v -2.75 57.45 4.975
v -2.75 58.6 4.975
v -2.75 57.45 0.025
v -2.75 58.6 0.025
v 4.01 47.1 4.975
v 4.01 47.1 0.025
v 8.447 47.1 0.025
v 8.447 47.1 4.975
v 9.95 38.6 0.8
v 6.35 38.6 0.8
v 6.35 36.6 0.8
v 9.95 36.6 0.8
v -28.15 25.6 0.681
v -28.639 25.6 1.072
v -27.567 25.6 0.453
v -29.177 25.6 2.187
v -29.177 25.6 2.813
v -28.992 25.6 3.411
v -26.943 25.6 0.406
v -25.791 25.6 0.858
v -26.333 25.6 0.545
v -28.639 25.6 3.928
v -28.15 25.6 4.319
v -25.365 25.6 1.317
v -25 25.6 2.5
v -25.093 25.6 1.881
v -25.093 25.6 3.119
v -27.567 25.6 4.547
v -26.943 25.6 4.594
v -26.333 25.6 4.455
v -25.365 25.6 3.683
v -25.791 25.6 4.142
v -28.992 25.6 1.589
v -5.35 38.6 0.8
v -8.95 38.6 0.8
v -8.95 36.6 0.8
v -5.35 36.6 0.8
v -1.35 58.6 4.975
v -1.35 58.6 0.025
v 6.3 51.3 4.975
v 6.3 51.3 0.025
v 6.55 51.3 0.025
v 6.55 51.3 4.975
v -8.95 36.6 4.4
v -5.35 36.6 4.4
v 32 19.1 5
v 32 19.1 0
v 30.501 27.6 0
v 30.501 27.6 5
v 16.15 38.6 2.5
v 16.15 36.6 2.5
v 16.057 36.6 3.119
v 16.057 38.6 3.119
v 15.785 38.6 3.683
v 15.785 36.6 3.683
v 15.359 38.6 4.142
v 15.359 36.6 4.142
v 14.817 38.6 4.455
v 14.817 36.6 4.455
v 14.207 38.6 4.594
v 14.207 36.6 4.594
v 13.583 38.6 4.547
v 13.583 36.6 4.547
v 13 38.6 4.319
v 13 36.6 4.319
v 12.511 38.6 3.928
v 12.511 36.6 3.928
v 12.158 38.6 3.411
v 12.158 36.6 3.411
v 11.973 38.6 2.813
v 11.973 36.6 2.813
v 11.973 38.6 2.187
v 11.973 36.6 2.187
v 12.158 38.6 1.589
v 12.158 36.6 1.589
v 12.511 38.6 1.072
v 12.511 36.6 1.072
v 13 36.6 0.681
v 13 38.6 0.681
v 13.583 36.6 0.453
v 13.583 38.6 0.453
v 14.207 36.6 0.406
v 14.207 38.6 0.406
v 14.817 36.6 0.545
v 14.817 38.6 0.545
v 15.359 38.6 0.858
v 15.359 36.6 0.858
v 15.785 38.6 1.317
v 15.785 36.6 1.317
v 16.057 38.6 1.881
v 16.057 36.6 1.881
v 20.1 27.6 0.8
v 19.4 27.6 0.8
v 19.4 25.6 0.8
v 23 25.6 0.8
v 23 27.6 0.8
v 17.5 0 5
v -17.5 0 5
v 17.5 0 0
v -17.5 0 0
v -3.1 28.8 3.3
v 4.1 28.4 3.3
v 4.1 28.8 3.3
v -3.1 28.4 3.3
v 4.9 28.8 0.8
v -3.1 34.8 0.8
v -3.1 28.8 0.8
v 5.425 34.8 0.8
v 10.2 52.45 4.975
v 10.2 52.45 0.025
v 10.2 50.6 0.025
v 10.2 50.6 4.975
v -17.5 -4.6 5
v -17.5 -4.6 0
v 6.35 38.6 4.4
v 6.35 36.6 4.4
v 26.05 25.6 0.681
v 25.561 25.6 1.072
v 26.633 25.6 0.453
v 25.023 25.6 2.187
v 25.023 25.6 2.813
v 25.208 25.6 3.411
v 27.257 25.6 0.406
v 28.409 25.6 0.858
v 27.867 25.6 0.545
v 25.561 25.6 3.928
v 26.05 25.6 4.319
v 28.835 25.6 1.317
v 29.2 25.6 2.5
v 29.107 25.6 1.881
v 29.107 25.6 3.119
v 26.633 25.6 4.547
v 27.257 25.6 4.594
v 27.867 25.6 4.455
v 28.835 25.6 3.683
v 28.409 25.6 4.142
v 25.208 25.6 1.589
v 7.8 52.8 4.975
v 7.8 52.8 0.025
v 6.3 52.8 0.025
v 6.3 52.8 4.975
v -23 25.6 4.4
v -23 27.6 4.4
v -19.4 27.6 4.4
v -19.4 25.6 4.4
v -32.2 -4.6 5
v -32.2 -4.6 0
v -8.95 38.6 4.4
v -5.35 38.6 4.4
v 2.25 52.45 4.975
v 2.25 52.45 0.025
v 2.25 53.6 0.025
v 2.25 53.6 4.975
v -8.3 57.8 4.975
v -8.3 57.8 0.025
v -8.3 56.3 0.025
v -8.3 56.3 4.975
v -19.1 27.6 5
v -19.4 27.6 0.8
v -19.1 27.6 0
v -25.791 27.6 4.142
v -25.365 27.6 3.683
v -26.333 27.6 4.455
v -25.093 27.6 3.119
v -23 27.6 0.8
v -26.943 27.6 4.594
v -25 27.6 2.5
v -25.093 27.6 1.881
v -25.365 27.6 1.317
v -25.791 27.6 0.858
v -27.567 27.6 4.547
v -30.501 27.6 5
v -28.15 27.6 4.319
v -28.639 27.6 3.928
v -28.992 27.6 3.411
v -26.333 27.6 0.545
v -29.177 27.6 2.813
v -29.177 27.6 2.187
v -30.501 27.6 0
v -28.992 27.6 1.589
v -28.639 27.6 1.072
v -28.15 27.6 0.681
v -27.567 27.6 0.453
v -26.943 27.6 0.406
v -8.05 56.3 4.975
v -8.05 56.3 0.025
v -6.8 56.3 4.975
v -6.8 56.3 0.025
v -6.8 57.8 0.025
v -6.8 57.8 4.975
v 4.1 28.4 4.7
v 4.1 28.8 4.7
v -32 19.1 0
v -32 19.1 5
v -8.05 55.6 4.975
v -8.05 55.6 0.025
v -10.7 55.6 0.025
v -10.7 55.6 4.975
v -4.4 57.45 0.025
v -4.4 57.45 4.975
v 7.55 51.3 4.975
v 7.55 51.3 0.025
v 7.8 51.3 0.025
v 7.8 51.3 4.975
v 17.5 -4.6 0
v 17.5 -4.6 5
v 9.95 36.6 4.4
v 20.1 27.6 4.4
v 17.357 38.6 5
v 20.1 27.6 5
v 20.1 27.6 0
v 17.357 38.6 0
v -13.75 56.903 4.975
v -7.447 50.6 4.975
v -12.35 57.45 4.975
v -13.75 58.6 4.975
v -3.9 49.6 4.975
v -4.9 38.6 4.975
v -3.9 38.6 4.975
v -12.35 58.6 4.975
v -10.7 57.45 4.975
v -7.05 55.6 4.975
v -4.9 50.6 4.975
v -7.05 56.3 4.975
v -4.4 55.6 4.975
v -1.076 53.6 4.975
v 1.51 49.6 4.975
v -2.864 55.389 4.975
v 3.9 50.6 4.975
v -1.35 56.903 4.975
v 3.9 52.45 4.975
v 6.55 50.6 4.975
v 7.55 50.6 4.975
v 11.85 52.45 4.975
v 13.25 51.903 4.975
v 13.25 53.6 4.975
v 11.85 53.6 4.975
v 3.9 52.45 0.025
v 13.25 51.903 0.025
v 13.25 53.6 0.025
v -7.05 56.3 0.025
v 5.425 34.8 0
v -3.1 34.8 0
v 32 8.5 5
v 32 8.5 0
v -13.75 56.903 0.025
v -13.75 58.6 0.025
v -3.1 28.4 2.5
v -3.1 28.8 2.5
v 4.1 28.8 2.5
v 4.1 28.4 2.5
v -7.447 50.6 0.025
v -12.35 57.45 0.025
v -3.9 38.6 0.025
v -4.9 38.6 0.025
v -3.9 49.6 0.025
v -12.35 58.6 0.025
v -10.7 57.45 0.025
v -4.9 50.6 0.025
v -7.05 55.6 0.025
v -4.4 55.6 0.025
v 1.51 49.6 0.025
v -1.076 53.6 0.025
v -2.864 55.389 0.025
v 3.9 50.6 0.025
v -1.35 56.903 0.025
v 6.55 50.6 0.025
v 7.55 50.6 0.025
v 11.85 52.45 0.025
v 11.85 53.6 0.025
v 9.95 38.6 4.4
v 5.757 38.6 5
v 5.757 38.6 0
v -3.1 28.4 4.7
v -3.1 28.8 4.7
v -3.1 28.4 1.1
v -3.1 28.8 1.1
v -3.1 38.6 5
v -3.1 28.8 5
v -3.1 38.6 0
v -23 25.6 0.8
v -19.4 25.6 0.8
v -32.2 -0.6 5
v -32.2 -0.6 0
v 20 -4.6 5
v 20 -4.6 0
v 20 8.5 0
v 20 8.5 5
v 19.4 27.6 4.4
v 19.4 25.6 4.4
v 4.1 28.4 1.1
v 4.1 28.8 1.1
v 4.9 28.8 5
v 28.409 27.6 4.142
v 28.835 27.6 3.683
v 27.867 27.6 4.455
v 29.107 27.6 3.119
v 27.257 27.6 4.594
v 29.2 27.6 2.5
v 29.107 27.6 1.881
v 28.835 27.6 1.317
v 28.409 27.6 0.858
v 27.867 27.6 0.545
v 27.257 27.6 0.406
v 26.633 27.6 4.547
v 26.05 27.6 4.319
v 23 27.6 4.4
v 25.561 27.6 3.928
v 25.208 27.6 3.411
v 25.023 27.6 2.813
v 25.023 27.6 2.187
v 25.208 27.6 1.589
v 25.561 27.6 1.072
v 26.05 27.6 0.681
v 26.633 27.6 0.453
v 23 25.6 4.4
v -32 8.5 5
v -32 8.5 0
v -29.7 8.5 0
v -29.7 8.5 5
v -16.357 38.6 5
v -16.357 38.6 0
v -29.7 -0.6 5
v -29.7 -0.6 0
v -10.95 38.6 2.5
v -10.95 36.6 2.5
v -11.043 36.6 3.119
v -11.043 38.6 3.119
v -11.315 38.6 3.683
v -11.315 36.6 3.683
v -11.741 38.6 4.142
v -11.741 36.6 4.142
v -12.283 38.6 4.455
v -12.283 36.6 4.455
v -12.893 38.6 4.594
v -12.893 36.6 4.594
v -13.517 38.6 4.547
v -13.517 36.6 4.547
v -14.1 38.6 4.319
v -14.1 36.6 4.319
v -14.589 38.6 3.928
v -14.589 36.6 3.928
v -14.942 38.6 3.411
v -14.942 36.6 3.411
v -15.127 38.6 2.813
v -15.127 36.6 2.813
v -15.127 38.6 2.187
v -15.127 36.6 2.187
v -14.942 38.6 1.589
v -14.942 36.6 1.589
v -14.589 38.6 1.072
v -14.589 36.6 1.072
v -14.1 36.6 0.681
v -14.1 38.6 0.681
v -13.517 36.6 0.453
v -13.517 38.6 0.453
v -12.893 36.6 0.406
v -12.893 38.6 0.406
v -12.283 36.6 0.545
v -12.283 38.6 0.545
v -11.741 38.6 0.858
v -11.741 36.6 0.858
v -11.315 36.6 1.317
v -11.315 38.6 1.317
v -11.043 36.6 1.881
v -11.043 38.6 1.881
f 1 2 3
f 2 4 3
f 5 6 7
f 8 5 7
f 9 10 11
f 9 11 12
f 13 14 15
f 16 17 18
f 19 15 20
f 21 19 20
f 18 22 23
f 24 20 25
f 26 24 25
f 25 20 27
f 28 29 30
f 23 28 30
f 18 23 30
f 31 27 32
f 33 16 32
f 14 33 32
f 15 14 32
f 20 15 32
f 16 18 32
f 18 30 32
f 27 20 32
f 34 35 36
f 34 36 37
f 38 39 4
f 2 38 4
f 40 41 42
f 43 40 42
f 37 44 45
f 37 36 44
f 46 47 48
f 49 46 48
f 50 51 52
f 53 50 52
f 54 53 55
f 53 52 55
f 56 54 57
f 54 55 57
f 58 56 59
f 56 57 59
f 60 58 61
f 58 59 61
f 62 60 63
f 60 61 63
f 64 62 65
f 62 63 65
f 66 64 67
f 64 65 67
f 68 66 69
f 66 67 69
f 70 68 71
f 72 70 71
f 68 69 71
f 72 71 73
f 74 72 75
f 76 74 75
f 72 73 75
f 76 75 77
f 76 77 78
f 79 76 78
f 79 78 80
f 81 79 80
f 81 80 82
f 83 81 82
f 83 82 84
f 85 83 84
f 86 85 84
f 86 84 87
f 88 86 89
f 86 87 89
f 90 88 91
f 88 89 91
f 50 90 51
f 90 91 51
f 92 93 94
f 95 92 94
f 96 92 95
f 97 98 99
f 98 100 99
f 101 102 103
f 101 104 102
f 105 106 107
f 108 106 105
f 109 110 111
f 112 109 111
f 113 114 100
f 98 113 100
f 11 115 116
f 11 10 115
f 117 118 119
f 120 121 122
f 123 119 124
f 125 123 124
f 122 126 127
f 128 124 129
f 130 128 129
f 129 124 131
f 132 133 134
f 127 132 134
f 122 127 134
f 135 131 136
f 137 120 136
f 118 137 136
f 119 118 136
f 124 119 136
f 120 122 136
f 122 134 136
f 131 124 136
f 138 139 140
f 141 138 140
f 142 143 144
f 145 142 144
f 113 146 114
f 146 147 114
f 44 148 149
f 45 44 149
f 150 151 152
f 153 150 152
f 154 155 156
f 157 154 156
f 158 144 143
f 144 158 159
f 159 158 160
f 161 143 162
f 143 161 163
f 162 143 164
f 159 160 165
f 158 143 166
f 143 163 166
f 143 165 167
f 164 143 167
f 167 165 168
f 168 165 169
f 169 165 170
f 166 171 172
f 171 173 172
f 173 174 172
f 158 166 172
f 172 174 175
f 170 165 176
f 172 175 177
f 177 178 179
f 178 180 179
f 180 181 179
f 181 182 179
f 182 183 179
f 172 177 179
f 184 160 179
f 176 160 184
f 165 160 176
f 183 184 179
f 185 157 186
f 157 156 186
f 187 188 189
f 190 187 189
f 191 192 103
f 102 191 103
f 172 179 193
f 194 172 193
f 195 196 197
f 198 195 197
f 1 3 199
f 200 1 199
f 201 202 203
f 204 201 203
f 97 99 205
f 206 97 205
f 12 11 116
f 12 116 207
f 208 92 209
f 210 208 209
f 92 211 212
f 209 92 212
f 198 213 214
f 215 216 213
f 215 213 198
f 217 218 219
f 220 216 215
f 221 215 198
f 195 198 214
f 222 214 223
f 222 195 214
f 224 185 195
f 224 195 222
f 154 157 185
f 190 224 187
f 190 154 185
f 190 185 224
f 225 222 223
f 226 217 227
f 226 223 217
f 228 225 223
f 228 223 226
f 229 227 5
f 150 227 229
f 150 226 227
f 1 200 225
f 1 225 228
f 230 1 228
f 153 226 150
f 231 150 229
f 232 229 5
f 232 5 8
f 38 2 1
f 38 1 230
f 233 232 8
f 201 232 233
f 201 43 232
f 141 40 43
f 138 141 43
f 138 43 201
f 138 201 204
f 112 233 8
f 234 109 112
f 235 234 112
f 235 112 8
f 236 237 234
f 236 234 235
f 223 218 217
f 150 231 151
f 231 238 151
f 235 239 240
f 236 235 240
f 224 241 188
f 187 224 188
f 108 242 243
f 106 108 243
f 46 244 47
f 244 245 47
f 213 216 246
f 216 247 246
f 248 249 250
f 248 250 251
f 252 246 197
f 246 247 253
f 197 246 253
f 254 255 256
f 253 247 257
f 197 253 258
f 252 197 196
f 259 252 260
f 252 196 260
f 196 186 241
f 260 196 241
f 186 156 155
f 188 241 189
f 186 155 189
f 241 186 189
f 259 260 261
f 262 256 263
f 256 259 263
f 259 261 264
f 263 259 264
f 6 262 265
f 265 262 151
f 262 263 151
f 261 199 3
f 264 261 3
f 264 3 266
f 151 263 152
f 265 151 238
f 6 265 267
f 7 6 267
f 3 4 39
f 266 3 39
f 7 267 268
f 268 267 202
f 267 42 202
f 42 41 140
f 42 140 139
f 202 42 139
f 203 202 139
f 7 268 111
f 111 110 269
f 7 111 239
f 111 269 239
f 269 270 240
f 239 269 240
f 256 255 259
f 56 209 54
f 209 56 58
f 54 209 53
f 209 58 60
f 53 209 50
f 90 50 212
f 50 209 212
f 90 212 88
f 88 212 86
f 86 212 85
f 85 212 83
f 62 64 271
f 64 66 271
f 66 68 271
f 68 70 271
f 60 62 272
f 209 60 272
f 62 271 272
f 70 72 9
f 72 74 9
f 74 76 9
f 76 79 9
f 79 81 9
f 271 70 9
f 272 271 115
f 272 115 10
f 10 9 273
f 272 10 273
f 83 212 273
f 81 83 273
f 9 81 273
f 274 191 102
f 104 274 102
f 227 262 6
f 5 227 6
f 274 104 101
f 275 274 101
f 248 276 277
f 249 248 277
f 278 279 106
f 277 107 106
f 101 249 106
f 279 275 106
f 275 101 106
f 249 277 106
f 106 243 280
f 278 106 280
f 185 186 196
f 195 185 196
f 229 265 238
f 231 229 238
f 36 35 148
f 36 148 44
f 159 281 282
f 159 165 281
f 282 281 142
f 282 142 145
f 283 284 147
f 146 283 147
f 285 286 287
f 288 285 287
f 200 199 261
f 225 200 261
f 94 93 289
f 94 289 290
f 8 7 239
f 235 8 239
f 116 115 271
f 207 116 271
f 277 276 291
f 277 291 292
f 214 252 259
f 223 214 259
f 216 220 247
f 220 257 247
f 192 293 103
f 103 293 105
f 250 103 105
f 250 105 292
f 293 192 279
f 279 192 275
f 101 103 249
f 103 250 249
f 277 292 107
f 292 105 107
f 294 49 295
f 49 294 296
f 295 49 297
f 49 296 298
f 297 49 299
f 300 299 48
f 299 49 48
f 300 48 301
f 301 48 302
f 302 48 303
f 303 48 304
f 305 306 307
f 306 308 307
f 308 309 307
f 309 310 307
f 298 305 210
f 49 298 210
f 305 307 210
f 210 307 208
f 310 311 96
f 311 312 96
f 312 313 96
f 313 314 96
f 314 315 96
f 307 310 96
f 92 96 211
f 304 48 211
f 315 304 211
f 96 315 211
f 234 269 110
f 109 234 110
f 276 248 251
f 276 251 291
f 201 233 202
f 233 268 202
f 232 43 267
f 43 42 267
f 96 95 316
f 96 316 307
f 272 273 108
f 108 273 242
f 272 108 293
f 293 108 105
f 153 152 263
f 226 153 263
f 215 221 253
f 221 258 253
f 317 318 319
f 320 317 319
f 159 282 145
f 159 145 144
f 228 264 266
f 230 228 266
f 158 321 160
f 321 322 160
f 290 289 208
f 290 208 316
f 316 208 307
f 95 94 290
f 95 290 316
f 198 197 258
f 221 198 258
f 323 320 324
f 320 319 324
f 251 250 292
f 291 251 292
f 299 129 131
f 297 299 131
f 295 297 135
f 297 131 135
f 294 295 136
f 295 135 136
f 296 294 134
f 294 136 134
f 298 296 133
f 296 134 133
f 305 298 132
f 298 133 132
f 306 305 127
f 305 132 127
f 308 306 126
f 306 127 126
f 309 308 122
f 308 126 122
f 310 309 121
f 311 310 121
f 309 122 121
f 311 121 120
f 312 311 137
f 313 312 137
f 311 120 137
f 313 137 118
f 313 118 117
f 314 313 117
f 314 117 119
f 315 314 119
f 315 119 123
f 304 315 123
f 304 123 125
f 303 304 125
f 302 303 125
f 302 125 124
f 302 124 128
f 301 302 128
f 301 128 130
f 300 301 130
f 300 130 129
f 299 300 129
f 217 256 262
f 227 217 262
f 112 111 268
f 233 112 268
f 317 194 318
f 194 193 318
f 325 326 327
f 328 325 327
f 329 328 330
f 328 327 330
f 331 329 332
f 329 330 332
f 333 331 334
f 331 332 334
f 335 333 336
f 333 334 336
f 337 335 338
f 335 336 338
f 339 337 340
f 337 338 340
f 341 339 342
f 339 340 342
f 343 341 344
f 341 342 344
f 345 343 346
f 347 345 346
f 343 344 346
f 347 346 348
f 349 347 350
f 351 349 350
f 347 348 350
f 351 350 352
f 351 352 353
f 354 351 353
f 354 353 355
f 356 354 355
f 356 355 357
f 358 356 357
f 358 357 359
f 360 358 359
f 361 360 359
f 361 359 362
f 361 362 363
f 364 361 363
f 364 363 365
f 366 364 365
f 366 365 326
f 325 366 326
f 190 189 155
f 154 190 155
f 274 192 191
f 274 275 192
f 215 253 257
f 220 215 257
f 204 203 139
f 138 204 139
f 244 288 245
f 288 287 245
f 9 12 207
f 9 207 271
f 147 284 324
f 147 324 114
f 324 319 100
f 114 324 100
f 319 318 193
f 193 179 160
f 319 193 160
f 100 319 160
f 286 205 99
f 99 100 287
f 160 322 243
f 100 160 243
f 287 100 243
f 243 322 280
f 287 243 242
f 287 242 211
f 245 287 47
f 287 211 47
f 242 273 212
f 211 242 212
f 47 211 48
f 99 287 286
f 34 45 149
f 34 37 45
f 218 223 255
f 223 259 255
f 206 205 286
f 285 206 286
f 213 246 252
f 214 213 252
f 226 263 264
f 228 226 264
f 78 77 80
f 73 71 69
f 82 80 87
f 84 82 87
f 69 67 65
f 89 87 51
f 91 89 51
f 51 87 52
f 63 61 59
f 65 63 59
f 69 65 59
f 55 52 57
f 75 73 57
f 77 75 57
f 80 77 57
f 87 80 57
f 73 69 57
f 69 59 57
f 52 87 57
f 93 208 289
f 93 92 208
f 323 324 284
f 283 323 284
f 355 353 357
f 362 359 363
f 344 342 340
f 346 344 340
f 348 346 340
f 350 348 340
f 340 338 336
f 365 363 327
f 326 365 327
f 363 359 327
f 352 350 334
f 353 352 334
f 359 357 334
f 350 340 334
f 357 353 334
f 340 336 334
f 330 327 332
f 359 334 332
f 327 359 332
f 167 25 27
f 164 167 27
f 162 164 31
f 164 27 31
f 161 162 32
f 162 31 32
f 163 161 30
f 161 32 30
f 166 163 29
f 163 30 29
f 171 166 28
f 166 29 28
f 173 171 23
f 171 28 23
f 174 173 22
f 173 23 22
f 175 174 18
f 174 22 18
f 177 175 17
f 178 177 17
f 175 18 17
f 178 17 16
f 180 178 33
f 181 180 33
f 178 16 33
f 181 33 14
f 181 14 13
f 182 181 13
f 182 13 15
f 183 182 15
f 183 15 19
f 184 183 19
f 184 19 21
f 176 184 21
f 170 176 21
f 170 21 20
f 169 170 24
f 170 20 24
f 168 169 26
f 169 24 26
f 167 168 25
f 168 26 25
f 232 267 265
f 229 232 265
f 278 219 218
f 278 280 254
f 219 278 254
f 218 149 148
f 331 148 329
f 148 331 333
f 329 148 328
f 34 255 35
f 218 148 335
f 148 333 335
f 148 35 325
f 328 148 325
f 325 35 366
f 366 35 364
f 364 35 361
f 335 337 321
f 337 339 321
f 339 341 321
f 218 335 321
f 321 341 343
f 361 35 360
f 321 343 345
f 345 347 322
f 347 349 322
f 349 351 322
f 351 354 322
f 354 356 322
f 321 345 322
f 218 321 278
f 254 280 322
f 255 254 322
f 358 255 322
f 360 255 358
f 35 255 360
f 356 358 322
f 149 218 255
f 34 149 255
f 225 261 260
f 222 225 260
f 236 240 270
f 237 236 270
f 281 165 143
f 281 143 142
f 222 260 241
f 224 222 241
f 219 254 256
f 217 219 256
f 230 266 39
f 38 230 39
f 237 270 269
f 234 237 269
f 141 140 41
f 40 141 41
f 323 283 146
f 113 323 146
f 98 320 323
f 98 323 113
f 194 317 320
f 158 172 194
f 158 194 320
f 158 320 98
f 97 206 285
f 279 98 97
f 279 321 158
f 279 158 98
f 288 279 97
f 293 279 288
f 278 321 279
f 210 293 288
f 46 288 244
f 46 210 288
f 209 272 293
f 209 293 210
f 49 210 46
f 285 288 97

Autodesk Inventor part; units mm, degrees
sketch "Sketch_1" plane through (0, 0, 0) normal (0, 0, 1) x (1, 0, 0)
  line L0 (-32.2, -0.6) -> (-32.2, -4.6)
  line L1 (-32.2, -4.6) -> (-17.5, -4.6)
  line L2 (-17.5, -4.6) -> (-17.5, 0)
  line L3 (-17.5, 0) -> (17.5, 0)
  line L4 (17.5, 0) -> (17.5, -4.6)
  line L5 (17.5, -4.6) -> (20, -4.6)
  line L6 (20, -4.6) -> (20, 8.5)
  line L7 (20, 8.5) -> (32, 8.5)
  line L8 (32, 8.5) -> (32, 19.1)
  line L9 (32, 19.1) -> (30.5012, 27.6)
  line L10 (30.5012, 27.6) -> (-30.5012, 27.6)
  line L11 (-30.5012, 27.6) -> (-32, 19.1)
  line L12 (-32, 19.1) -> (-32, 8.5)
  line L13 (-32, 8.5) -> (-29.7, 8.5)
  line L14 (-29.7, 8.5) -> (-29.7, -0.6)
  line L15 (-29.7, -0.6) -> (-32.2, -0.6)
extrude "Extrusion1" add sketch "Sketch_1" along normal blind 5
sketch "Sketch_2" plane through (0, 0, 0) normal (0, 0, 1) x (1, 0, 0)
  line L0 (-19.1, 27.6) -> (-18.2, 27.6)
  line L1 (-18.2, 27.6) -> (-18.2, 15.1)
  line L2 (-18.2, 15.1) -> (19.2, 15.1)
  line L3 (19.2, 15.1) -> (19.2, 27.6)
  line L4 (19.2, 27.6) -> (20.1, 27.6)
  line L5 (20.1, 27.6) -> (17.3574, 38.6)
  line L6 (17.3574, 38.6) -> (5.7574, 38.6)
  line L7 (5.7574, 38.6) -> (4.9, 28.8)
  line L8 (4.9, 28.8) -> (-3.1, 28.8)
  line L9 (-3.1, 28.8) -> (-3.1, 38.6)
  line L10 (-3.1, 38.6) -> (-16.3574, 38.6)
  line L11 (-16.3574, 38.6) -> (-19.1, 27.6)
extrude "Extrusion2" add sketch "Sketch_2" along normal blind 5
sketch "Skizze_3" plane through (0, 0, 0) normal (0, 0, 1) x (1, 0, 0)
  line L0 (-3.1, 34.8) -> (-3.1, 28.8)
  line L1 (-3.1, 28.8) -> (5.9, 28.8)
  line L2 (5.9, 28.8) -> (5.9, 34.8)
  line L3 (5.9, 34.8) -> (-3.1, 34.8)
extrude "Extrusion3" add sketch "Skizze_3" along normal blind 0.8
sketch "Sketch_3" plane through (0.5, 0, 0) normal (1, 0, 0) x (0, 0, -1)
  line L0 (-4.7, 28.4) -> (-3.3, 28.4)
  line L1 (-3.3, 28.4) -> (-3.3, 28.8)
  line L2 (-3.3, 28.8) -> (-2.5, 28.8)
  line L3 (-2.5, 28.8) -> (-2.5, 28.4)
  line L4 (-2.5, 28.4) -> (-1.1, 28.4)
  line L5 (-1.1, 28.4) -> (-1.1, 29.8)
  line L6 (-1.1, 29.8) -> (-4.7, 29.8)
  line L7 (-4.7, 29.8) -> (-4.7, 28.4)
extrude "Extrusion4" cut sketch "Sketch_3" along normal mid plane 7.2
sketch "Sketch_4" plane through (0, 0, 2.5) normal (0, 0, 1) x (1, 0, 0)
  line L0 (27.1, 25.6) -> (27.1, 27.6)
  line L1 (27.1, 27.6) -> (29.2, 27.6)
  line L2 (29.2, 27.6) -> (29.2, 25.6)
  line L3 (29.2, 25.6) -> (27.1, 25.6)
  line L4 (27.1, 25.6) -> (27.1, 27.6)
revolve "Revolution1" cut sketch "Sketch_4" angle 360 about axis through (27.1, 25.6, 2.5) along (0, -1, 0)
sketch "Sketch_5" plane through (0, 0, 2.5) normal (0, 0, 1) x (1, 0, 0)
  line L0 (-27.1, 25.6) -> (-27.1, 27.6)
  line L1 (-27.1, 27.6) -> (-25, 27.6)
  line L2 (-25, 27.6) -> (-25, 25.6)
  line L3 (-25, 25.6) -> (-27.1, 25.6)
  line L4 (-27.1, 25.6) -> (-27.1, 27.6)
revolve "Revolution2" cut sketch "Sketch_5" angle 360 about axis through (-27.1, 25.6, 2.5) along (0, -1, 0)
sketch "Sketch_6" plane through (0, 0, 2.5) normal (0, 0, 1) x (1, 0, 0)
  line L0 (14.05, 36.6) -> (14.05, 38.6)
  line L1 (14.05, 38.6) -> (16.15, 38.6)
  line L2 (16.15, 38.6) -> (16.15, 36.6)
  line L3 (16.15, 36.6) -> (14.05, 36.6)
  line L4 (14.05, 36.6) -> (14.05, 38.6)
revolve "Revolution3" cut sketch "Sketch_6" angle 360 about axis through (14.05, 36.6, 2.5) along (0, -1, 0)
sketch "Sketch_7" plane through (0, 0, 2.5) normal (0, 0, 1) x (1, 0, 0)
  line L0 (-13.05, 36.6) -> (-13.05, 38.6)
  line L1 (-13.05, 38.6) -> (-10.95, 38.6)
  line L2 (-10.95, 38.6) -> (-10.95, 36.6)
  line L3 (-10.95, 36.6) -> (-13.05, 36.6)
  line L4 (-13.05, 36.6) -> (-13.05, 38.6)
revolve "Revolution4" cut sketch "Sketch_7" angle 360 about axis through (-13.05, 36.6, 2.5) along (0, -1, 0)
sketch "Skizze_15" plane through (0, 0, 2.5) normal (0, 0, 1) x (1, 0, 0)
  line L0 (-4.9, 36.6) -> (-3.9, 36.6)
  line L1 (-3.9, 36.6) -> (-3.9, 38.6)
  line L2 (-3.9, 38.6) -> (-4.9, 38.6)
  line L3 (-4.9, 38.6) -> (-4.9, 36.6)
extrude "Extrusion5" cut sketch "Skizze_15" along normal mid plane 4.1
sketch "Skizze_11" plane through (0, 0, 0.8) normal (0, 0, 1) x (1, 0, 0)
  line L0 (19.4, 25.6) -> (23, 25.6)
  line L1 (23, 25.6) -> (23, 27.6)
  line L2 (23, 27.6) -> (19.4, 27.6)
  line L3 (19.4, 27.6) -> (19.4, 25.6)
extrude "Extrusion6" cut sketch "Skizze_11" along normal blind 3.6
sketch "Skizze_12" plane through (0, 0, 0.8) normal (0, 0, 1) x (1, 0, 0)
  line L0 (-23, 25.6) -> (-19.4, 25.6)
  line L1 (-19.4, 25.6) -> (-19.4, 27.6)
  line L2 (-19.4, 27.6) -> (-23, 27.6)
  line L3 (-23, 27.6) -> (-23, 25.6)
extrude "Extrusion7" cut sketch "Skizze_12" along normal blind 3.6
sketch "Skizze_13" plane through (0, 0, 0.8) normal (0, 0, 1) x (1, 0, 0)
  line L0 (6.35, 36.6) -> (9.95, 36.6)
  line L1 (9.95, 36.6) -> (9.95, 38.6)
  line L2 (9.95, 38.6) -> (6.35, 38.6)
  line L3 (6.35, 38.6) -> (6.35, 36.6)
extrude "Extrusion8" cut sketch "Skizze_13" along normal blind 3.6
sketch "Skizze_14" plane through (0, 0, 0.8) normal (0, 0, 1) x (1, 0, 0)
  line L0 (-8.95, 36.6) -> (-5.35, 36.6)
  line L1 (-5.35, 36.6) -> (-5.35, 38.6)
  line L2 (-5.35, 38.6) -> (-8.95, 38.6)
  line L3 (-8.95, 38.6) -> (-8.95, 36.6)
extrude "Extrusion9" cut sketch "Skizze_14" along normal blind 3.6
sketch "Sketch_8" plane through (0, 0, 2.5) normal (0, 0, 1) x (1, 0, 0)
  line L0 (-13.75, 56.9029) -> (-7.4471, 50.6)
  line L1 (-7.4471, 50.6) -> (-4.9, 50.6)
  line L2 (-4.9, 50.6) -> (-4.9, 33.6)
  line L3 (-4.9, 33.6) -> (-3.9, 33.6)
  line L4 (-3.9, 33.6) -> (-3.9, 49.6)
  line L5 (-3.9, 49.6) -> (1.5103, 49.6)
  line L6 (1.5103, 49.6) -> (4.0103, 47.1)
  line L7 (4.0103, 47.1) -> (8.4471, 47.1)
  line L8 (8.4471, 47.1) -> (13.25, 51.9029)
  line L9 (13.25, 51.9029) -> (13.25, 53.6)
  line L10 (13.25, 53.6) -> (11.85, 53.6)
  line L11 (11.85, 53.6) -> (11.85, 52.45)
  line L12 (11.85, 52.45) -> (10.2, 52.45)
  line L13 (10.2, 52.45) -> (10.2, 50.6)
  line L14 (10.2, 50.6) -> (7.55, 50.6)
  line L15 (7.55, 50.6) -> (7.55, 51.3)
  line L16 (7.55, 51.3) -> (7.8, 51.3)
  line L17 (7.8, 51.3) -> (7.8, 52.8)
  line L18 (7.8, 52.8) -> (6.3, 52.8)
  line L19 (6.3, 52.8) -> (6.3, 51.3)
  line L20 (6.3, 51.3) -> (6.55, 51.3)
  line L21 (6.55, 51.3) -> (6.55, 50.6)
  line L22 (6.55, 50.6) -> (3.9, 50.6)
  line L23 (3.9, 50.6) -> (3.9, 52.45)
  line L24 (3.9, 52.45) -> (2.25, 52.45)
  line L25 (2.25, 52.45) -> (2.25, 53.6)
  line L26 (2.25, 53.6) -> (-1.0755, 53.6)
  line L27 (-1.0755, 53.6) -> (-2.8642, 55.3887)
  line L28 (-2.8642, 55.3887) -> (-1.35, 56.9029)
  line L29 (-1.35, 56.9029) -> (-1.35, 58.6)
  line L30 (-1.35, 58.6) -> (-2.75, 58.6)
  line L31 (-2.75, 58.6) -> (-2.75, 57.45)
  line L32 (-2.75, 57.45) -> (-4.4, 57.45)
  line L33 (-4.4, 57.45) -> (-4.4, 55.6)
  line L34 (-4.4, 55.6) -> (-7.05, 55.6)
  line L35 (-7.05, 55.6) -> (-7.05, 56.3)
  line L36 (-7.05, 56.3) -> (-6.8, 56.3)
  line L37 (-6.8, 56.3) -> (-6.8, 57.8)
  line L38 (-6.8, 57.8) -> (-8.3, 57.8)
  line L39 (-8.3, 57.8) -> (-8.3, 56.3)
  line L40 (-8.3, 56.3) -> (-8.05, 56.3)
  line L41 (-8.05, 56.3) -> (-8.05, 55.6)
  line L42 (-8.05, 55.6) -> (-10.7, 55.6)
  line L43 (-10.7, 55.6) -> (-10.7, 57.45)
  line L44 (-10.7, 57.45) -> (-12.35, 57.45)
  line L45 (-12.35, 57.45) -> (-12.35, 58.6)
  line L46 (-12.35, 58.6) -> (-13.75, 58.6)
  line L47 (-13.75, 58.6) -> (-13.75, 56.9029)
extrude "Extrusion10" add sketch "Sketch_8" along normal mid plane 4.95
ref_plane "1_1001_XY" through (7.05, 53.6, 2.5) normal (0, 1, 0) x (-1, 0, 0)
ref_plane "1_1001_YZ" through (7.05, 53.6, 2.5) normal (-1, 0, 0) x (0, 0, 1)
ref_plane "1_1001_ZX" through (7.05, 53.6, 2.5) normal (0, 0, 1) x (0, 1, 0)
ref_plane "1_1002_XY" through (-7.55, 58.6, 2.5) normal (0, 1, 0) x (-1, 0, 0)
ref_plane "1_1002_YZ" through (-7.55, 58.6, 2.5) normal (-1, 0, 0) x (0, 0, 1)
ref_plane "1_1002_ZX" through (-7.55, 58.6, 2.5) normal (0, 0, 1) x (0, 1, 0)
ref_plane "1_13_XY" through (0.4, 28.8, 2) normal (0, 1, 0) x (-1, 0, 0)
ref_plane "1_13_YZ" through (0.4, 28.8, 2) normal (-1, 0, 0) x (0, 0, 1)
ref_plane "1_13_ZX" through (0.4, 28.8, 2) normal (0, 0, 1) x (0, 1, 0)
ref_plane "1_14_XY" through (0.4, 28.8, 3.8) normal (0, 1, 0) x (-1, 0, 0)
ref_plane "1_14_YZ" through (0.4, 28.8, 3.8) normal (-1, 0, 0) x (0, 0, 1)
ref_plane "1_14_ZX" through (0.4, 28.8, 3.8) normal (0, 0, 1) x (0, 1, 0)
ref_plane "1_2_XY" through (-21.2, 27.6, 2.6) normal (0, 1, 0) x (1, 0, 0)
ref_plane "1_2_YZ" through (-21.2, 27.6, 2.6) normal (1, 0, 0) x (0, 0, -1)
ref_plane "1_2_ZX" through (-21.2, 27.6, 2.6) normal (0, 0, -1) x (0, 1, 0)
ref_plane "1_3_XY" through (-7.15, 38.6, 2.6) normal (0, 1, 0) x (1, 0, 0)
ref_plane "1_3_YZ" through (-7.15, 38.6, 2.6) normal (1, 0, 0) x (0, 0, -1)
ref_plane "1_3_ZX" through (-7.15, 38.6, 2.6) normal (0, 0, -1) x (0, 1, 0)
ref_plane "1_4_XY" through (8.15, 38.6, 2.6) normal (0, 1, 0) x (-1, 0, 0)
ref_plane "1_4_YZ" through (8.15, 38.6, 2.6) normal (-1, 0, 0) x (0, 0, 1)
ref_plane "1_4_ZX" through (8.15, 38.6, 2.6) normal (0, 0, 1) x (0, 1, 0)
ref_plane "1_5_XY" through (21.55, 27.6, 2.6) normal (0, 1, 0) x (-1, 0, 0)
ref_plane "1_5_YZ" through (21.55, 27.6, 2.6) normal (-1, 0, 0) x (0, 0, 1)
ref_plane "1_5_ZX" through (21.55, 27.6, 2.6) normal (0, 0, 1) x (0, 1, 0)
ref_plane "1_6_XY" through (-27.1, 27.6, 2.5) normal (0, 1, 0) x (1, 0, 0)
ref_plane "1_6_YZ" through (-27.1, 27.6, 2.5) normal (1, 0, 0) x (0, 0, -1)
ref_plane "1_6_ZX" through (-27.1, 27.6, 2.5) normal (0, 0, -1) x (0, 1, 0)
ref_plane "1_7_XY" through (-13.05, 38.6, 2.5) normal (0, 1, 0) x (1, 0, 0)
ref_plane "1_7_YZ" through (-13.05, 38.6, 2.5) normal (1, 0, 0) x (0, 0, -1)
ref_plane "1_7_ZX" through (-13.05, 38.6, 2.5) normal (0, 0, -1) x (0, 1, 0)
ref_plane "1_8_XY" through (14.05, 38.6, 2.5) normal (0, 1, 0) x (-1, 0, 0)
ref_plane "1_8_YZ" through (14.05, 38.6, 2.5) normal (-1, 0, 0) x (0, 0, 1)
ref_plane "1_8_ZX" through (14.05, 38.6, 2.5) normal (0, 0, 1) x (0, 1, 0)
ref_plane "1_9_XY" through (27.1, 27.6, 2.5) normal (0, 1, 0) x (-1, 0, 0)
ref_plane "1_9_YZ" through (27.1, 27.6, 2.5) normal (-1, 0, 0) x (0, 0, 1)
ref_plane "1_9_ZX" through (27.1, 27.6, 2.5) normal (0, 0, 1) x (0, 1, 0)
ref_plane "MD_XY" through (0, 0, 0) normal (0, -1, 0) x (0, 0, 1)
ref_plane "MD_YZ" through (0, 0, 0) normal (0, 0, 1) x (-1, 0, 0)
ref_plane "MD_ZX" through (0, 0, 0) normal (-1, 0, 0) x (0, -1, 0)
ref_plane "OP_XY" through (-32.2, -4.6, 0) normal (0, 1, 0) x (0, 0, 1)
ref_plane "OP_YZ" through (-32.2, -4.6, 0) normal (0, 0, 1) x (1, 0, 0)
ref_plane "OP_ZX" through (-32.2, -4.6, 0) normal (1, 0, 0) x (0, 1, 0)
ref_plane "a1_XY" through (27.1, 12.6, 2.5) normal (0, 1, 0) x (-1, 0, 0)
ref_plane "a1_YZ" through (27.1, 12.6, 2.5) normal (-1, 0, 0) x (0, 0, 1)
ref_plane "a1_ZX" through (27.1, 12.6, 2.5) normal (0, 0, 1) x (0, 1, 0)
ref_plane "a2_XY" through (14.05, 23.6, 2.5) normal (0, 1, 0) x (-1, 0, 0)
ref_plane "a2_YZ" through (14.05, 23.6, 2.5) normal (-1, 0, 0) x (0, 0, 1)
ref_plane "a2_ZX" through (14.05, 23.6, 2.5) normal (0, 0, 1) x (0, 1, 0)
ref_plane "b3_XY" through (-13.05, 23.6, 2.5) normal (0, 1, 0) x (1, 0, 0)
ref_plane "b3_YZ" through (-13.05, 23.6, 2.5) normal (1, 0, 0) x (0, 0, -1)
ref_plane "b3_ZX" through (-13.05, 23.6, 2.5) normal (0, 0, -1) x (0, 1, 0)
ref_plane "b4_XY" through (-27.1, 12.6, 2.5) normal (0, 1, 0) x (1, 0, 0)
ref_plane "b4_YZ" through (-27.1, 12.6, 2.5) normal (1, 0, 0) x (0, 0, -1)
ref_plane "b4_ZX" through (-27.1, 12.6, 2.5) normal (0, 0, -1) x (0, 1, 0)
ref_plane "j5_XY" through (0.4, 22.8, 2) normal (0, 1, 0) x (-1, 0, 0)
ref_plane "j5_YZ" through (0.4, 22.8, 2) normal (-1, 0, 0) x (0, 0, 1)
ref_plane "j5_ZX" through (0.4, 22.8, 2) normal (0, 0, 1) x (0, 1, 0)
ref_plane "j6_XY" through (0.4, 22.8, 3.8) normal (0, 1, 0) x (-1, 0, 0)
ref_plane "j6_YZ" through (0.4, 22.8, 3.8) normal (-1, 0, 0) x (0, 0, 1)
ref_plane "j6_ZX" through (0.4, 22.8, 3.8) normal (0, 0, 1) x (0, 1, 0)
ref_plane "m7_XY" through (7.05, 53.6, 2.5) normal (0, 1, 0) x (-1, 0, 0)
ref_plane "m7_YZ" through (7.05, 53.6, 2.5) normal (-1, 0, 0) x (0, 0, 1)
ref_plane "m7_ZX" through (7.05, 53.6, 2.5) normal (0, 0, 1) x (0, 1, 0)
ref_plane "m8_XY" through (-7.55, 58.6, 2.5) normal (0, 1, 0) x (-1, 0, 0)
ref_plane "m8_YZ" through (-7.55, 58.6, 2.5) normal (-1, 0, 0) x (0, 0, 1)
ref_plane "m8_ZX" through (-7.55, 58.6, 2.5) normal (0, 0, 1) x (0, 1, 0)
ref_plane "z10_XY" through (8.15, 38.6, 2.6) normal (0, 1, 0) x (-1, 0, 0)
ref_plane "z10_YZ" through (8.15, 38.6, 2.6) normal (-1, 0, 0) x (0, 0, 1)
ref_plane "z10_ZX" through (8.15, 38.6, 2.6) normal (0, 0, 1) x (0, 1, 0)
ref_plane "z11_XY" through (-7.15, 38.6, 2.6) normal (0, 1, 0) x (1, 0, 0)
ref_plane "z11_YZ" through (-7.15, 38.6, 2.6) normal (1, 0, 0) x (0, 0, -1)
ref_plane "z11_ZX" through (-7.15, 38.6, 2.6) normal (0, 0, -1) x (0, 1, 0)
ref_plane "z12_XY" through (-21.2, 27.6, 2.6) normal (0, 1, 0) x (1, 0, 0)
ref_plane "z12_YZ" through (-21.2, 27.6, 2.6) normal (1, 0, 0) x (0, 0, -1)
ref_plane "z12_ZX" through (-21.2, 27.6, 2.6) normal (0, 0, -1) x (0, 1, 0)
ref_plane "z9_XY" through (21.55, 27.6, 2.6) normal (0, 1, 0) x (-1, 0, 0)
ref_plane "z9_YZ" through (21.55, 27.6, 2.6) normal (-1, 0, 0) x (0, 0, 1)
ref_plane "z9_ZX" through (21.55, 27.6, 2.6) normal (0, 0, 1) x (0, 1, 0)
sketch "Sketch15" plane through (-27.1, 25.6, 2.5) normal (0, 1, 0) x (1, 0, 0)
  circle A0 centre (0, 0) radius 2.1 projected
sketch "Sketch16" plane through (-13.05, 36.6, 2.5) normal (0, 1, 0) x (1, 0, 0)
  circle A0 centre (0, 0) radius 2.1 projected
sketch "Sketch17" plane through (14.05, 36.6, 2.5) normal (0, 1, 0) x (1, 0, 0)
  circle A0 centre (0, 0) radius 2.1 projected
sketch "Sketch18" plane through (27.1, 25.6, 2.5) normal (0, 1, 0) x (1, 0, 0)
  circle A0 centre (0, 0) radius 2.1 projected
properties part number "280-519_LO"
